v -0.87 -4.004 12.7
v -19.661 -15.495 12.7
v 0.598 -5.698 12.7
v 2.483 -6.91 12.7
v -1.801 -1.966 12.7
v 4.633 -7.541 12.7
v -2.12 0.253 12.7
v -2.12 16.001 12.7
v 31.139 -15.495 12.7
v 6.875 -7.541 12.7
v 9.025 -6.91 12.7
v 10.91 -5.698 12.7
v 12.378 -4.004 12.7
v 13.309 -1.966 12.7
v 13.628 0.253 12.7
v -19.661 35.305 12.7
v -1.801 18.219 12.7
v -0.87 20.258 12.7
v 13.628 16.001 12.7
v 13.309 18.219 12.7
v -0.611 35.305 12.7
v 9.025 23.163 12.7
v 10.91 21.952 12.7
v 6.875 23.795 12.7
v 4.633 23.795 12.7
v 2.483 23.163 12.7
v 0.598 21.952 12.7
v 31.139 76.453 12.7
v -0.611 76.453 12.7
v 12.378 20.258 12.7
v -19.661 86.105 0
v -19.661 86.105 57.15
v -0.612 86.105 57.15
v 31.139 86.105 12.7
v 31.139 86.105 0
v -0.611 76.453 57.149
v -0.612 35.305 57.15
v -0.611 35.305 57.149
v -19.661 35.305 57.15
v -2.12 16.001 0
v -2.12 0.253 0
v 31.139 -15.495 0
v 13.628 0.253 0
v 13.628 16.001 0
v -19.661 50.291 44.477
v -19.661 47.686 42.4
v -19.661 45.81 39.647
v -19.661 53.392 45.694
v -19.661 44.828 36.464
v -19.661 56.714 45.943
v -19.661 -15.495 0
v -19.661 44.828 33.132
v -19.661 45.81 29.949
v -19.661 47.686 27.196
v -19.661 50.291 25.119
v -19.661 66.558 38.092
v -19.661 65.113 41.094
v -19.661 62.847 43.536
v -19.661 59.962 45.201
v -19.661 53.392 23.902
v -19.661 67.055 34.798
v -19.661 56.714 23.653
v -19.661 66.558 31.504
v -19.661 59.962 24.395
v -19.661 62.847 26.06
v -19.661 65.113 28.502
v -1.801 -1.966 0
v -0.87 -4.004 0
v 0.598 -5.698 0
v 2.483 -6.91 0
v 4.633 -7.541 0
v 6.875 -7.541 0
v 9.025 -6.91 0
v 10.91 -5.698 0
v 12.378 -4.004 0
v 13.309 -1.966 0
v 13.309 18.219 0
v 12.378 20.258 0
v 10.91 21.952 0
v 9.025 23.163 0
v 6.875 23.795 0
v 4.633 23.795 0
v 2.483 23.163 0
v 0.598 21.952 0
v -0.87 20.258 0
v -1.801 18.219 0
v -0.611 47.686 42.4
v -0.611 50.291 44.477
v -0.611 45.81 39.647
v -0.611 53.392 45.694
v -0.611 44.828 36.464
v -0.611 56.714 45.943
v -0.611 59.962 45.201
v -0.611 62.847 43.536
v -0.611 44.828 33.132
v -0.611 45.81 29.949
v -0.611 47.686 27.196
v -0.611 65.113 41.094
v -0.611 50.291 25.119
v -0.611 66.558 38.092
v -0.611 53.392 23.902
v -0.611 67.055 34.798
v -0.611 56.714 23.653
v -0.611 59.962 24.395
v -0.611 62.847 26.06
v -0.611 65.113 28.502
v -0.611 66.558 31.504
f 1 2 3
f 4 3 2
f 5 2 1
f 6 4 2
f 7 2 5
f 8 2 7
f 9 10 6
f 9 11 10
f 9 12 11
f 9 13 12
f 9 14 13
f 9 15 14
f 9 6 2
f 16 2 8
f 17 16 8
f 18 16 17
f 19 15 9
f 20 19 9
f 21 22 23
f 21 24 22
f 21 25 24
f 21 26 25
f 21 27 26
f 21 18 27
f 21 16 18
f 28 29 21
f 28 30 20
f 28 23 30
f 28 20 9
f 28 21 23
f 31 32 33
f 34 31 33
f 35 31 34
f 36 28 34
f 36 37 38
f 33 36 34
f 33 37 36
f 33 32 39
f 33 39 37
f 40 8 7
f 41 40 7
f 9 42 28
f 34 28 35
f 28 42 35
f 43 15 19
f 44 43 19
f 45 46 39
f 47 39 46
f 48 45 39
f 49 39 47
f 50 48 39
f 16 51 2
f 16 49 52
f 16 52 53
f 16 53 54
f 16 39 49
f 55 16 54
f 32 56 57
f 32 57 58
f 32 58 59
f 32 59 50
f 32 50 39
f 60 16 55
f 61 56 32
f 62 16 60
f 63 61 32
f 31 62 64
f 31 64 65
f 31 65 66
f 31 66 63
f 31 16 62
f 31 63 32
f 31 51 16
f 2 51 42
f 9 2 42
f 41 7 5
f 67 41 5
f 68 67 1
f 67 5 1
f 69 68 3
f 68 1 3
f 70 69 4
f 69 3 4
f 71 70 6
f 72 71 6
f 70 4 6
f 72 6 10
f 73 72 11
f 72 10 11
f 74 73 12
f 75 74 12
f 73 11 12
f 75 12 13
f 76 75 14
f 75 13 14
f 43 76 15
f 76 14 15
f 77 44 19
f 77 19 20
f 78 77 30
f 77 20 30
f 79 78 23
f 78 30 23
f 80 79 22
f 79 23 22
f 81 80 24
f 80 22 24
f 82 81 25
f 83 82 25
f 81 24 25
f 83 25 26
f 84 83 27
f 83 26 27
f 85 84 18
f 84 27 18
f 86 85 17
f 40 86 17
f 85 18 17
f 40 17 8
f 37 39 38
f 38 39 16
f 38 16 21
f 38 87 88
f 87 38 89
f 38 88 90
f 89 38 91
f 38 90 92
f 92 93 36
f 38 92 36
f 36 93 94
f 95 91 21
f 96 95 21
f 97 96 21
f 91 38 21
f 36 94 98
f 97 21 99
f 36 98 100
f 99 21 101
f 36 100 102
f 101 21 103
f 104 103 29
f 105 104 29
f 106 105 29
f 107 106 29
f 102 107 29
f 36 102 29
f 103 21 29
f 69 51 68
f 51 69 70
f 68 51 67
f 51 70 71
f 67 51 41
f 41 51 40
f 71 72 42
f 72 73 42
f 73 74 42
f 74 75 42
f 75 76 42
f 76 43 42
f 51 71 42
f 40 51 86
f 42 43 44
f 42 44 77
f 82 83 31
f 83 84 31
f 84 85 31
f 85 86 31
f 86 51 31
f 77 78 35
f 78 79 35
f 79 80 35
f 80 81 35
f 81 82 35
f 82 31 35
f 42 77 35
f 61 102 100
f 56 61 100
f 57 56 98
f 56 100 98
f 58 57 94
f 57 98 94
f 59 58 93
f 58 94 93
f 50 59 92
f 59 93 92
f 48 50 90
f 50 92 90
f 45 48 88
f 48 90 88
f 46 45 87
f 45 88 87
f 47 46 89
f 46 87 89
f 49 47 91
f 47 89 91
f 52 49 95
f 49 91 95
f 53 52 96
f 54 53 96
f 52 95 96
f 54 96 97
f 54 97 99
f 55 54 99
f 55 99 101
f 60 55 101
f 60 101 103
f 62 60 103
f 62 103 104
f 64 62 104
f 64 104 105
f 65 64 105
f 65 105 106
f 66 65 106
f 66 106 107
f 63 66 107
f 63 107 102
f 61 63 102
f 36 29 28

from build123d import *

# Parameters (mm, degrees)
F0_W      = 50.8
F0_H      = 101.6
F1_DEPTH  = 12.7
F2_W      = 19.05
F2_H      = 50.8
F3_DEPTH  = 44.45
F5_DEPTH  = 25.4
F6_W      = 31.75
F6_H      = 9.652
F7_DEPTH  = 44.45
F8_SIZE2  = 31.7503775051
F8_SIZE   = 44.45
F9_R      = 11.176
F10_DEPTH = 25.4


with BuildPart() as f1:
    # F0 (on Top) → F1 (new body)
    with BuildSketch(Plane.XY):
        with Locations((5.7387277484, 35.3047995863)):
            Rectangle(F0_W, F0_H)
    extrude(amount=F1_DEPTH)

    # F2 (on face) → F3 (join)
    with BuildSketch(Plane.XY.offset(12.7)):
        with Locations((-10.1362722516, 60.7047995863)):
            Rectangle(F2_W, F2_H)
    extrude(amount=F3_DEPTH)

    # F4 (on face) → F5 (cut)
    with BuildSketch(Plane.XY.offset(12.7)):
        with BuildLine():
            Line((-2.1200233605, 16.0007995863), (-2.1200233605, 0.2527995863))
            ThreePointArc((-2.1200233605, 0.2527995863), (5.7539766395, -7.6212004137), (13.6279766395, 0.2527995863))
            Line((13.6279766395, 0.2527995863), (13.6279766395, 16.0007995863))
            ThreePointArc((13.6279766395, 16.0007995863), (5.7539766395, 23.8747995863), (-2.1200233605, 16.0007995863))
        make_face()
    extrude(amount=-F5_DEPTH, mode=Mode.SUBTRACT)

    # F6 (on face) → F7 (join)
    with BuildSketch(Plane.XY.offset(12.7)):
        with Locations((15.2637277484, 81.2787995863)):
            Rectangle(F6_W, F6_H)
    extrude(amount=F7_DEPTH)

    # F8
    f8_edges = [f1.edges().sort_by_distance(p)[0] for p in [
        (31.138728, 81.2788, 57.15),
    ]]
    f8_side = f1.faces().sort_by_distance((31.138728, -14.329495, 6.35))[0]
    chamfer(f8_edges, length=F8_SIZE, length2=F8_SIZE2, reference=f8_side)

    # F9 (on face) → F10 (cut)
    with BuildSketch(Plane.YZ.offset(-0.6112722516)):
        with Locations((55.8787995863, 34.798)):
            Circle(F9_R)
    extrude(amount=-F10_DEPTH, mode=Mode.SUBTRACT)


solid = f1.part
